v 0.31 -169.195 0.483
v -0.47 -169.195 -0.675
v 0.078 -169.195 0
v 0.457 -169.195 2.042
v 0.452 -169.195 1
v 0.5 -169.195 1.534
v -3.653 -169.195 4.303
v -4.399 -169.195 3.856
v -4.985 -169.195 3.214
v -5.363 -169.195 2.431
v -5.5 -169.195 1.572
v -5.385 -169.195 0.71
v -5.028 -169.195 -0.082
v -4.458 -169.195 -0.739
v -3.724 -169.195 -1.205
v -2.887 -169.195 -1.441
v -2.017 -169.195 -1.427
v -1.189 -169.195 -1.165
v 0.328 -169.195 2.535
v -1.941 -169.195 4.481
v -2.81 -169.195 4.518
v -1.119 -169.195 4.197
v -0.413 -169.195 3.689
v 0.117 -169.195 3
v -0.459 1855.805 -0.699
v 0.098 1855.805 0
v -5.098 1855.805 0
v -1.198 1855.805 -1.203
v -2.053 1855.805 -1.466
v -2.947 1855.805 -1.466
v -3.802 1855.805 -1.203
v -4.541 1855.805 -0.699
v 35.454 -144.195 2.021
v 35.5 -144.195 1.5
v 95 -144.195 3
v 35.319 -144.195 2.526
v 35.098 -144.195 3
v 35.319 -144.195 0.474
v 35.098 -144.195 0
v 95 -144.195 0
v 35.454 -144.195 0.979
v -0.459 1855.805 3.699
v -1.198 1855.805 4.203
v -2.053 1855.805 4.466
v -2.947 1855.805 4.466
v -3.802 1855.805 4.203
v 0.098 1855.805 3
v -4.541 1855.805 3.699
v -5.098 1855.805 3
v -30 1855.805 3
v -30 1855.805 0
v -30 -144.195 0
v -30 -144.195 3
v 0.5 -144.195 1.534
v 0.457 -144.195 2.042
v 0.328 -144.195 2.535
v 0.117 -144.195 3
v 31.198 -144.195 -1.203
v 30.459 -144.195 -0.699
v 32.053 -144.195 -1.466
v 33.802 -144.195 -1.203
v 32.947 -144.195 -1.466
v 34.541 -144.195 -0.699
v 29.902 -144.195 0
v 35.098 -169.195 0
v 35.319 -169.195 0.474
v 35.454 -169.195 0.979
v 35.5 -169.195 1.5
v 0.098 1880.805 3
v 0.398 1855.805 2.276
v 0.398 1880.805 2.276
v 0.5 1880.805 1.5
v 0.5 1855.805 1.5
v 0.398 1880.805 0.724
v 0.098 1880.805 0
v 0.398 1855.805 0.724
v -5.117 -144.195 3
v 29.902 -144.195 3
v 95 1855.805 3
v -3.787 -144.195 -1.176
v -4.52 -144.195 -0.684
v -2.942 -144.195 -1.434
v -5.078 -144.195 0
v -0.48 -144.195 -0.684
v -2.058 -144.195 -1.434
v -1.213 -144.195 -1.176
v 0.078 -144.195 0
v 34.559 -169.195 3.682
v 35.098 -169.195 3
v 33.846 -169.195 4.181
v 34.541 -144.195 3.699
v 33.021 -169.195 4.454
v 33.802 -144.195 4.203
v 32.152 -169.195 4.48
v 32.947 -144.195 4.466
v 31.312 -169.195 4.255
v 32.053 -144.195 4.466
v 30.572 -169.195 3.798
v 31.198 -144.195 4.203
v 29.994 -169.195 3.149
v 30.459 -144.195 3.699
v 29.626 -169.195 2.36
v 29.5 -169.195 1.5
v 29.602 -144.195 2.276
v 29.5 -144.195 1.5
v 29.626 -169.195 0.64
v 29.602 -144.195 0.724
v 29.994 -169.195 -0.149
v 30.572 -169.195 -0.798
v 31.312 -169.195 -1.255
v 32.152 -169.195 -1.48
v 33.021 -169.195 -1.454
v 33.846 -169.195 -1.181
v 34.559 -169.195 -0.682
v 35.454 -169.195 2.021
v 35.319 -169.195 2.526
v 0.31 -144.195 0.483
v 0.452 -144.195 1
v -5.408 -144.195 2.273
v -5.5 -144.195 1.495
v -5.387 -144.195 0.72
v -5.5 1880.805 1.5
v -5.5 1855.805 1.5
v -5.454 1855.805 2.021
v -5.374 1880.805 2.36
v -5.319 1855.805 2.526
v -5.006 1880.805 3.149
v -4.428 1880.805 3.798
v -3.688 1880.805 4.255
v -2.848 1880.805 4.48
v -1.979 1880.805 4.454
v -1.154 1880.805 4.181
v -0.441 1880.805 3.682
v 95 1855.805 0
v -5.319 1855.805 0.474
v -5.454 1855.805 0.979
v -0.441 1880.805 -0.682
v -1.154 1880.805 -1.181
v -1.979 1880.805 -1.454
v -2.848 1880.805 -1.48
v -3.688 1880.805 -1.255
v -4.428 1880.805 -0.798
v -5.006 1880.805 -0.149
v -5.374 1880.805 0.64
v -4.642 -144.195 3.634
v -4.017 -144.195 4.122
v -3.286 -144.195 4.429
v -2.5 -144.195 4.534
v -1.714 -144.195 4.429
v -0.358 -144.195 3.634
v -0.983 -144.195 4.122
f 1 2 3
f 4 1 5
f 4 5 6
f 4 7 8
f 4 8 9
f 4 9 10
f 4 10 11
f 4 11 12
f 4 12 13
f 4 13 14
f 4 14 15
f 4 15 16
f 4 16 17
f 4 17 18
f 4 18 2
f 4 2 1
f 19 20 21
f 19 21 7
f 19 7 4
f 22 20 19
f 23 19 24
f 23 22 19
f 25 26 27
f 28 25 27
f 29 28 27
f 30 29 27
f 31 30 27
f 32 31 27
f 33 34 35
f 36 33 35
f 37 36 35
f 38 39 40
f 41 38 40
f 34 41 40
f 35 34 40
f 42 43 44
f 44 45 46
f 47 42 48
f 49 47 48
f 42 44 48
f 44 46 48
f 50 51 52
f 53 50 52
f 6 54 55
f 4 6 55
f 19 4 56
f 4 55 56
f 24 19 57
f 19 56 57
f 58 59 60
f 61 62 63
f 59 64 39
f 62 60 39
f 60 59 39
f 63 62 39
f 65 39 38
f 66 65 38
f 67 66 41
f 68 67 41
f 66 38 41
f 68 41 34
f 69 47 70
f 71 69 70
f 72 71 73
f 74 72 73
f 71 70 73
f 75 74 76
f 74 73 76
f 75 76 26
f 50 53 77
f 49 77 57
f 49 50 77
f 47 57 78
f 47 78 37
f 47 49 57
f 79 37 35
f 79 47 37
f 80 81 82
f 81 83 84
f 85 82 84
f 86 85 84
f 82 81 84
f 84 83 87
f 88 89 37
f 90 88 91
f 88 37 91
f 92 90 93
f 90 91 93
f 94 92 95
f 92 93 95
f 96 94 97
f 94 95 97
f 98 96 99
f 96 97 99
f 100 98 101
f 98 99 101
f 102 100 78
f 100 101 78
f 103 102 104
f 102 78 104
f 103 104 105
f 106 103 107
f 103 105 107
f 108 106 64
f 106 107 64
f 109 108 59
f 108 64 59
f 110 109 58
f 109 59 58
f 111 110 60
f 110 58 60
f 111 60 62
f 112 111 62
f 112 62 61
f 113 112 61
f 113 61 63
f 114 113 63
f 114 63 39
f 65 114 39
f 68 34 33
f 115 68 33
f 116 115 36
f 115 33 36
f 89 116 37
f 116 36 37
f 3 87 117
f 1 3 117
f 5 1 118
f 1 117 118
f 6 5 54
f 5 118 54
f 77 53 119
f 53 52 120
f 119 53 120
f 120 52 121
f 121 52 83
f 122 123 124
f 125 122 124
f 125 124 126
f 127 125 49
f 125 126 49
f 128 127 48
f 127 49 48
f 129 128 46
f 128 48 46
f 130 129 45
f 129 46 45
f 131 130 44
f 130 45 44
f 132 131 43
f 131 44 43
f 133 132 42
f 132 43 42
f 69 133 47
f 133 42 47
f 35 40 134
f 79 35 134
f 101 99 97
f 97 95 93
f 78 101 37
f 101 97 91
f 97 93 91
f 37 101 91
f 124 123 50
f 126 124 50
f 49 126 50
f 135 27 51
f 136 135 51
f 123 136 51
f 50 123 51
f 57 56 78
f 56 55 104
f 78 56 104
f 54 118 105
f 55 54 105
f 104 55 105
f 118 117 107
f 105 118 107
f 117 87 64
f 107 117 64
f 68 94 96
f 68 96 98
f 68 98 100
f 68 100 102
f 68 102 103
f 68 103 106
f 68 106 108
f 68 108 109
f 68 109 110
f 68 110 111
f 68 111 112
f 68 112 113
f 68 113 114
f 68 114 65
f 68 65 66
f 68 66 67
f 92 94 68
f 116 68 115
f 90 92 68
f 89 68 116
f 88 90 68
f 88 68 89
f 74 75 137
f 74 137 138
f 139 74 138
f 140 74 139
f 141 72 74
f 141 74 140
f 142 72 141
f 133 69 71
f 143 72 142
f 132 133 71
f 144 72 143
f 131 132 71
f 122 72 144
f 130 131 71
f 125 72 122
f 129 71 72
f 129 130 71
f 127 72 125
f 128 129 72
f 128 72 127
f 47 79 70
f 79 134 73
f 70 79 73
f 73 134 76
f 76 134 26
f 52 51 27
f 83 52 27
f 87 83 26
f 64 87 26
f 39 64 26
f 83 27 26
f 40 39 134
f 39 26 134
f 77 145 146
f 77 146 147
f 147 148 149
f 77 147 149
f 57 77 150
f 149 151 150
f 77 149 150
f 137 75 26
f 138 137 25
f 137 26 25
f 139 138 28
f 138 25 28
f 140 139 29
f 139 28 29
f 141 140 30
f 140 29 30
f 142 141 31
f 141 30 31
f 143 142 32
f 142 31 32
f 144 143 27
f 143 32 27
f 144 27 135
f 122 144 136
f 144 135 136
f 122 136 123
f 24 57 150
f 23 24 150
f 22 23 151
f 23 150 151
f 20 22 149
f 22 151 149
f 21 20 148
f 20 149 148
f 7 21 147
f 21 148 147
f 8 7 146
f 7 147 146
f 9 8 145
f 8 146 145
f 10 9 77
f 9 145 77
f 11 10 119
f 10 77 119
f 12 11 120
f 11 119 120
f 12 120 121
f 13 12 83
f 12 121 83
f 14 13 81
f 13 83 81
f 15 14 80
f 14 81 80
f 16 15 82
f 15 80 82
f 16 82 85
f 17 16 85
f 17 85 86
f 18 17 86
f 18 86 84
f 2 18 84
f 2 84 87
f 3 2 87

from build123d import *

# Parameters (mm, degrees)
F1_DEPTH = 3
F3_DEPTH = 25
F5_DEPTH = 25
F7_DEPTH = 25


# Not quite as in the source:
# - a feature names something its author has since deleted; it is built from what else it names


with BuildPart() as f1:
    # F0 (on Top) → F1 (new body)
    with BuildSketch(Plane.XY):
        Polygon((-5, 1855.804875493), (-30, 1855.804875493), (-30, -144.195124507), (-5, -144.195124507), (-5, -164.195124507), (0, -164.195124507), (0, -144.195124507), (30, -144.195124507), (30, -164.195124507), (35, -164.195124507), (35, -144.195124507), (95, -144.195124507), (95, 1855.804875493), (0, 1855.804875493), (0, 1875.804875493), (-5, 1875.804875493), align=None)
    extrude(amount=F1_DEPTH)

    # F2 (on face) → F3 (join)
    with BuildSketch(Plane.XZ.offset(144.195124507)):
        with BuildLine():
            Line((35, 3), (35.0980762114, 3))
            ThreePointArc((35.0980762114, 3), (29.5, 1.5), (35.0980762114, 0))
            Line((35.0980762114, 0), (35, 0))
            Line((35, 0), (35, 3))
        make_face()
        with BuildLine():
            ThreePointArc((35.0980762114, 0), (35.3977774789, 0.7235428647), (35.5, 1.5))
            ThreePointArc((35.5, 1.5), (35.3977774789, 2.2764571353), (35.0980762114, 3))
            Line((35.0980762114, 3), (35, 3))
            Line((35, 3), (35, 0))
            Line((35, 0), (35.0980762114, 0))
        make_face()
    extrude(amount=F3_DEPTH)

    # F4 (on face) → F5 (join)
    with BuildSketch(Plane(origin=(0, 1855.804875493, 0), x_dir=(-1, 0, 0), z_dir=(0, 1, 0))):
        with BuildLine():
            Line((0, 3), (-0.0980762114, 3))
            ThreePointArc((-0.0980762114, 3), (-0.5, 1.5), (-0.0980762114, 0))
            Line((-0.0980762114, 0), (0, 0))
            Line((0, 0), (0, 3))
        make_face()
        with BuildLine():
            ThreePointArc((-0.0980762114, 0), (3.2764571353, -1.3977774789), (5.5, 1.5))
            ThreePointArc((5.5, 1.5), (3.2764571353, 4.3977774789), (-0.0980762114, 3))
            Line((-0.0980762114, 3), (0, 3))
            Line((0, 3), (0, 0))
            Line((0, 0), (-0.0980762114, 0))
        make_face()
    extrude(amount=F5_DEPTH)

    # F6 (on face) → F7 (join)
    with BuildSketch(Plane.XZ.offset(144.195124507)):
        with BuildLine():
            ThreePointArc((0.0783741164, 0), (0.3926737069, 0.7383586703), (0.5, 1.5336188953))
            ThreePointArc((0.5, 1.5336188953), (0.4027223964, 2.2913805262), (0.1171982072, 3))
            Line((0.1171982072, 3), (0, 3))
            Line((0, 3), (0, 0))
            Line((0, 0), (0.0783741164, 0))
        make_face()
        with BuildLine():
            Line((0, 3), (0.1171982072, 3))
            ThreePointArc((0.1171982072, 3), (-5.4997488132, 1.5724397355), (0.0783741164, 0))
            Line((0.0783741164, 0), (0, 0))
            Line((0, 0), (0, 3))
        make_face()
    extrude(amount=F7_DEPTH)


solid = f1.part
